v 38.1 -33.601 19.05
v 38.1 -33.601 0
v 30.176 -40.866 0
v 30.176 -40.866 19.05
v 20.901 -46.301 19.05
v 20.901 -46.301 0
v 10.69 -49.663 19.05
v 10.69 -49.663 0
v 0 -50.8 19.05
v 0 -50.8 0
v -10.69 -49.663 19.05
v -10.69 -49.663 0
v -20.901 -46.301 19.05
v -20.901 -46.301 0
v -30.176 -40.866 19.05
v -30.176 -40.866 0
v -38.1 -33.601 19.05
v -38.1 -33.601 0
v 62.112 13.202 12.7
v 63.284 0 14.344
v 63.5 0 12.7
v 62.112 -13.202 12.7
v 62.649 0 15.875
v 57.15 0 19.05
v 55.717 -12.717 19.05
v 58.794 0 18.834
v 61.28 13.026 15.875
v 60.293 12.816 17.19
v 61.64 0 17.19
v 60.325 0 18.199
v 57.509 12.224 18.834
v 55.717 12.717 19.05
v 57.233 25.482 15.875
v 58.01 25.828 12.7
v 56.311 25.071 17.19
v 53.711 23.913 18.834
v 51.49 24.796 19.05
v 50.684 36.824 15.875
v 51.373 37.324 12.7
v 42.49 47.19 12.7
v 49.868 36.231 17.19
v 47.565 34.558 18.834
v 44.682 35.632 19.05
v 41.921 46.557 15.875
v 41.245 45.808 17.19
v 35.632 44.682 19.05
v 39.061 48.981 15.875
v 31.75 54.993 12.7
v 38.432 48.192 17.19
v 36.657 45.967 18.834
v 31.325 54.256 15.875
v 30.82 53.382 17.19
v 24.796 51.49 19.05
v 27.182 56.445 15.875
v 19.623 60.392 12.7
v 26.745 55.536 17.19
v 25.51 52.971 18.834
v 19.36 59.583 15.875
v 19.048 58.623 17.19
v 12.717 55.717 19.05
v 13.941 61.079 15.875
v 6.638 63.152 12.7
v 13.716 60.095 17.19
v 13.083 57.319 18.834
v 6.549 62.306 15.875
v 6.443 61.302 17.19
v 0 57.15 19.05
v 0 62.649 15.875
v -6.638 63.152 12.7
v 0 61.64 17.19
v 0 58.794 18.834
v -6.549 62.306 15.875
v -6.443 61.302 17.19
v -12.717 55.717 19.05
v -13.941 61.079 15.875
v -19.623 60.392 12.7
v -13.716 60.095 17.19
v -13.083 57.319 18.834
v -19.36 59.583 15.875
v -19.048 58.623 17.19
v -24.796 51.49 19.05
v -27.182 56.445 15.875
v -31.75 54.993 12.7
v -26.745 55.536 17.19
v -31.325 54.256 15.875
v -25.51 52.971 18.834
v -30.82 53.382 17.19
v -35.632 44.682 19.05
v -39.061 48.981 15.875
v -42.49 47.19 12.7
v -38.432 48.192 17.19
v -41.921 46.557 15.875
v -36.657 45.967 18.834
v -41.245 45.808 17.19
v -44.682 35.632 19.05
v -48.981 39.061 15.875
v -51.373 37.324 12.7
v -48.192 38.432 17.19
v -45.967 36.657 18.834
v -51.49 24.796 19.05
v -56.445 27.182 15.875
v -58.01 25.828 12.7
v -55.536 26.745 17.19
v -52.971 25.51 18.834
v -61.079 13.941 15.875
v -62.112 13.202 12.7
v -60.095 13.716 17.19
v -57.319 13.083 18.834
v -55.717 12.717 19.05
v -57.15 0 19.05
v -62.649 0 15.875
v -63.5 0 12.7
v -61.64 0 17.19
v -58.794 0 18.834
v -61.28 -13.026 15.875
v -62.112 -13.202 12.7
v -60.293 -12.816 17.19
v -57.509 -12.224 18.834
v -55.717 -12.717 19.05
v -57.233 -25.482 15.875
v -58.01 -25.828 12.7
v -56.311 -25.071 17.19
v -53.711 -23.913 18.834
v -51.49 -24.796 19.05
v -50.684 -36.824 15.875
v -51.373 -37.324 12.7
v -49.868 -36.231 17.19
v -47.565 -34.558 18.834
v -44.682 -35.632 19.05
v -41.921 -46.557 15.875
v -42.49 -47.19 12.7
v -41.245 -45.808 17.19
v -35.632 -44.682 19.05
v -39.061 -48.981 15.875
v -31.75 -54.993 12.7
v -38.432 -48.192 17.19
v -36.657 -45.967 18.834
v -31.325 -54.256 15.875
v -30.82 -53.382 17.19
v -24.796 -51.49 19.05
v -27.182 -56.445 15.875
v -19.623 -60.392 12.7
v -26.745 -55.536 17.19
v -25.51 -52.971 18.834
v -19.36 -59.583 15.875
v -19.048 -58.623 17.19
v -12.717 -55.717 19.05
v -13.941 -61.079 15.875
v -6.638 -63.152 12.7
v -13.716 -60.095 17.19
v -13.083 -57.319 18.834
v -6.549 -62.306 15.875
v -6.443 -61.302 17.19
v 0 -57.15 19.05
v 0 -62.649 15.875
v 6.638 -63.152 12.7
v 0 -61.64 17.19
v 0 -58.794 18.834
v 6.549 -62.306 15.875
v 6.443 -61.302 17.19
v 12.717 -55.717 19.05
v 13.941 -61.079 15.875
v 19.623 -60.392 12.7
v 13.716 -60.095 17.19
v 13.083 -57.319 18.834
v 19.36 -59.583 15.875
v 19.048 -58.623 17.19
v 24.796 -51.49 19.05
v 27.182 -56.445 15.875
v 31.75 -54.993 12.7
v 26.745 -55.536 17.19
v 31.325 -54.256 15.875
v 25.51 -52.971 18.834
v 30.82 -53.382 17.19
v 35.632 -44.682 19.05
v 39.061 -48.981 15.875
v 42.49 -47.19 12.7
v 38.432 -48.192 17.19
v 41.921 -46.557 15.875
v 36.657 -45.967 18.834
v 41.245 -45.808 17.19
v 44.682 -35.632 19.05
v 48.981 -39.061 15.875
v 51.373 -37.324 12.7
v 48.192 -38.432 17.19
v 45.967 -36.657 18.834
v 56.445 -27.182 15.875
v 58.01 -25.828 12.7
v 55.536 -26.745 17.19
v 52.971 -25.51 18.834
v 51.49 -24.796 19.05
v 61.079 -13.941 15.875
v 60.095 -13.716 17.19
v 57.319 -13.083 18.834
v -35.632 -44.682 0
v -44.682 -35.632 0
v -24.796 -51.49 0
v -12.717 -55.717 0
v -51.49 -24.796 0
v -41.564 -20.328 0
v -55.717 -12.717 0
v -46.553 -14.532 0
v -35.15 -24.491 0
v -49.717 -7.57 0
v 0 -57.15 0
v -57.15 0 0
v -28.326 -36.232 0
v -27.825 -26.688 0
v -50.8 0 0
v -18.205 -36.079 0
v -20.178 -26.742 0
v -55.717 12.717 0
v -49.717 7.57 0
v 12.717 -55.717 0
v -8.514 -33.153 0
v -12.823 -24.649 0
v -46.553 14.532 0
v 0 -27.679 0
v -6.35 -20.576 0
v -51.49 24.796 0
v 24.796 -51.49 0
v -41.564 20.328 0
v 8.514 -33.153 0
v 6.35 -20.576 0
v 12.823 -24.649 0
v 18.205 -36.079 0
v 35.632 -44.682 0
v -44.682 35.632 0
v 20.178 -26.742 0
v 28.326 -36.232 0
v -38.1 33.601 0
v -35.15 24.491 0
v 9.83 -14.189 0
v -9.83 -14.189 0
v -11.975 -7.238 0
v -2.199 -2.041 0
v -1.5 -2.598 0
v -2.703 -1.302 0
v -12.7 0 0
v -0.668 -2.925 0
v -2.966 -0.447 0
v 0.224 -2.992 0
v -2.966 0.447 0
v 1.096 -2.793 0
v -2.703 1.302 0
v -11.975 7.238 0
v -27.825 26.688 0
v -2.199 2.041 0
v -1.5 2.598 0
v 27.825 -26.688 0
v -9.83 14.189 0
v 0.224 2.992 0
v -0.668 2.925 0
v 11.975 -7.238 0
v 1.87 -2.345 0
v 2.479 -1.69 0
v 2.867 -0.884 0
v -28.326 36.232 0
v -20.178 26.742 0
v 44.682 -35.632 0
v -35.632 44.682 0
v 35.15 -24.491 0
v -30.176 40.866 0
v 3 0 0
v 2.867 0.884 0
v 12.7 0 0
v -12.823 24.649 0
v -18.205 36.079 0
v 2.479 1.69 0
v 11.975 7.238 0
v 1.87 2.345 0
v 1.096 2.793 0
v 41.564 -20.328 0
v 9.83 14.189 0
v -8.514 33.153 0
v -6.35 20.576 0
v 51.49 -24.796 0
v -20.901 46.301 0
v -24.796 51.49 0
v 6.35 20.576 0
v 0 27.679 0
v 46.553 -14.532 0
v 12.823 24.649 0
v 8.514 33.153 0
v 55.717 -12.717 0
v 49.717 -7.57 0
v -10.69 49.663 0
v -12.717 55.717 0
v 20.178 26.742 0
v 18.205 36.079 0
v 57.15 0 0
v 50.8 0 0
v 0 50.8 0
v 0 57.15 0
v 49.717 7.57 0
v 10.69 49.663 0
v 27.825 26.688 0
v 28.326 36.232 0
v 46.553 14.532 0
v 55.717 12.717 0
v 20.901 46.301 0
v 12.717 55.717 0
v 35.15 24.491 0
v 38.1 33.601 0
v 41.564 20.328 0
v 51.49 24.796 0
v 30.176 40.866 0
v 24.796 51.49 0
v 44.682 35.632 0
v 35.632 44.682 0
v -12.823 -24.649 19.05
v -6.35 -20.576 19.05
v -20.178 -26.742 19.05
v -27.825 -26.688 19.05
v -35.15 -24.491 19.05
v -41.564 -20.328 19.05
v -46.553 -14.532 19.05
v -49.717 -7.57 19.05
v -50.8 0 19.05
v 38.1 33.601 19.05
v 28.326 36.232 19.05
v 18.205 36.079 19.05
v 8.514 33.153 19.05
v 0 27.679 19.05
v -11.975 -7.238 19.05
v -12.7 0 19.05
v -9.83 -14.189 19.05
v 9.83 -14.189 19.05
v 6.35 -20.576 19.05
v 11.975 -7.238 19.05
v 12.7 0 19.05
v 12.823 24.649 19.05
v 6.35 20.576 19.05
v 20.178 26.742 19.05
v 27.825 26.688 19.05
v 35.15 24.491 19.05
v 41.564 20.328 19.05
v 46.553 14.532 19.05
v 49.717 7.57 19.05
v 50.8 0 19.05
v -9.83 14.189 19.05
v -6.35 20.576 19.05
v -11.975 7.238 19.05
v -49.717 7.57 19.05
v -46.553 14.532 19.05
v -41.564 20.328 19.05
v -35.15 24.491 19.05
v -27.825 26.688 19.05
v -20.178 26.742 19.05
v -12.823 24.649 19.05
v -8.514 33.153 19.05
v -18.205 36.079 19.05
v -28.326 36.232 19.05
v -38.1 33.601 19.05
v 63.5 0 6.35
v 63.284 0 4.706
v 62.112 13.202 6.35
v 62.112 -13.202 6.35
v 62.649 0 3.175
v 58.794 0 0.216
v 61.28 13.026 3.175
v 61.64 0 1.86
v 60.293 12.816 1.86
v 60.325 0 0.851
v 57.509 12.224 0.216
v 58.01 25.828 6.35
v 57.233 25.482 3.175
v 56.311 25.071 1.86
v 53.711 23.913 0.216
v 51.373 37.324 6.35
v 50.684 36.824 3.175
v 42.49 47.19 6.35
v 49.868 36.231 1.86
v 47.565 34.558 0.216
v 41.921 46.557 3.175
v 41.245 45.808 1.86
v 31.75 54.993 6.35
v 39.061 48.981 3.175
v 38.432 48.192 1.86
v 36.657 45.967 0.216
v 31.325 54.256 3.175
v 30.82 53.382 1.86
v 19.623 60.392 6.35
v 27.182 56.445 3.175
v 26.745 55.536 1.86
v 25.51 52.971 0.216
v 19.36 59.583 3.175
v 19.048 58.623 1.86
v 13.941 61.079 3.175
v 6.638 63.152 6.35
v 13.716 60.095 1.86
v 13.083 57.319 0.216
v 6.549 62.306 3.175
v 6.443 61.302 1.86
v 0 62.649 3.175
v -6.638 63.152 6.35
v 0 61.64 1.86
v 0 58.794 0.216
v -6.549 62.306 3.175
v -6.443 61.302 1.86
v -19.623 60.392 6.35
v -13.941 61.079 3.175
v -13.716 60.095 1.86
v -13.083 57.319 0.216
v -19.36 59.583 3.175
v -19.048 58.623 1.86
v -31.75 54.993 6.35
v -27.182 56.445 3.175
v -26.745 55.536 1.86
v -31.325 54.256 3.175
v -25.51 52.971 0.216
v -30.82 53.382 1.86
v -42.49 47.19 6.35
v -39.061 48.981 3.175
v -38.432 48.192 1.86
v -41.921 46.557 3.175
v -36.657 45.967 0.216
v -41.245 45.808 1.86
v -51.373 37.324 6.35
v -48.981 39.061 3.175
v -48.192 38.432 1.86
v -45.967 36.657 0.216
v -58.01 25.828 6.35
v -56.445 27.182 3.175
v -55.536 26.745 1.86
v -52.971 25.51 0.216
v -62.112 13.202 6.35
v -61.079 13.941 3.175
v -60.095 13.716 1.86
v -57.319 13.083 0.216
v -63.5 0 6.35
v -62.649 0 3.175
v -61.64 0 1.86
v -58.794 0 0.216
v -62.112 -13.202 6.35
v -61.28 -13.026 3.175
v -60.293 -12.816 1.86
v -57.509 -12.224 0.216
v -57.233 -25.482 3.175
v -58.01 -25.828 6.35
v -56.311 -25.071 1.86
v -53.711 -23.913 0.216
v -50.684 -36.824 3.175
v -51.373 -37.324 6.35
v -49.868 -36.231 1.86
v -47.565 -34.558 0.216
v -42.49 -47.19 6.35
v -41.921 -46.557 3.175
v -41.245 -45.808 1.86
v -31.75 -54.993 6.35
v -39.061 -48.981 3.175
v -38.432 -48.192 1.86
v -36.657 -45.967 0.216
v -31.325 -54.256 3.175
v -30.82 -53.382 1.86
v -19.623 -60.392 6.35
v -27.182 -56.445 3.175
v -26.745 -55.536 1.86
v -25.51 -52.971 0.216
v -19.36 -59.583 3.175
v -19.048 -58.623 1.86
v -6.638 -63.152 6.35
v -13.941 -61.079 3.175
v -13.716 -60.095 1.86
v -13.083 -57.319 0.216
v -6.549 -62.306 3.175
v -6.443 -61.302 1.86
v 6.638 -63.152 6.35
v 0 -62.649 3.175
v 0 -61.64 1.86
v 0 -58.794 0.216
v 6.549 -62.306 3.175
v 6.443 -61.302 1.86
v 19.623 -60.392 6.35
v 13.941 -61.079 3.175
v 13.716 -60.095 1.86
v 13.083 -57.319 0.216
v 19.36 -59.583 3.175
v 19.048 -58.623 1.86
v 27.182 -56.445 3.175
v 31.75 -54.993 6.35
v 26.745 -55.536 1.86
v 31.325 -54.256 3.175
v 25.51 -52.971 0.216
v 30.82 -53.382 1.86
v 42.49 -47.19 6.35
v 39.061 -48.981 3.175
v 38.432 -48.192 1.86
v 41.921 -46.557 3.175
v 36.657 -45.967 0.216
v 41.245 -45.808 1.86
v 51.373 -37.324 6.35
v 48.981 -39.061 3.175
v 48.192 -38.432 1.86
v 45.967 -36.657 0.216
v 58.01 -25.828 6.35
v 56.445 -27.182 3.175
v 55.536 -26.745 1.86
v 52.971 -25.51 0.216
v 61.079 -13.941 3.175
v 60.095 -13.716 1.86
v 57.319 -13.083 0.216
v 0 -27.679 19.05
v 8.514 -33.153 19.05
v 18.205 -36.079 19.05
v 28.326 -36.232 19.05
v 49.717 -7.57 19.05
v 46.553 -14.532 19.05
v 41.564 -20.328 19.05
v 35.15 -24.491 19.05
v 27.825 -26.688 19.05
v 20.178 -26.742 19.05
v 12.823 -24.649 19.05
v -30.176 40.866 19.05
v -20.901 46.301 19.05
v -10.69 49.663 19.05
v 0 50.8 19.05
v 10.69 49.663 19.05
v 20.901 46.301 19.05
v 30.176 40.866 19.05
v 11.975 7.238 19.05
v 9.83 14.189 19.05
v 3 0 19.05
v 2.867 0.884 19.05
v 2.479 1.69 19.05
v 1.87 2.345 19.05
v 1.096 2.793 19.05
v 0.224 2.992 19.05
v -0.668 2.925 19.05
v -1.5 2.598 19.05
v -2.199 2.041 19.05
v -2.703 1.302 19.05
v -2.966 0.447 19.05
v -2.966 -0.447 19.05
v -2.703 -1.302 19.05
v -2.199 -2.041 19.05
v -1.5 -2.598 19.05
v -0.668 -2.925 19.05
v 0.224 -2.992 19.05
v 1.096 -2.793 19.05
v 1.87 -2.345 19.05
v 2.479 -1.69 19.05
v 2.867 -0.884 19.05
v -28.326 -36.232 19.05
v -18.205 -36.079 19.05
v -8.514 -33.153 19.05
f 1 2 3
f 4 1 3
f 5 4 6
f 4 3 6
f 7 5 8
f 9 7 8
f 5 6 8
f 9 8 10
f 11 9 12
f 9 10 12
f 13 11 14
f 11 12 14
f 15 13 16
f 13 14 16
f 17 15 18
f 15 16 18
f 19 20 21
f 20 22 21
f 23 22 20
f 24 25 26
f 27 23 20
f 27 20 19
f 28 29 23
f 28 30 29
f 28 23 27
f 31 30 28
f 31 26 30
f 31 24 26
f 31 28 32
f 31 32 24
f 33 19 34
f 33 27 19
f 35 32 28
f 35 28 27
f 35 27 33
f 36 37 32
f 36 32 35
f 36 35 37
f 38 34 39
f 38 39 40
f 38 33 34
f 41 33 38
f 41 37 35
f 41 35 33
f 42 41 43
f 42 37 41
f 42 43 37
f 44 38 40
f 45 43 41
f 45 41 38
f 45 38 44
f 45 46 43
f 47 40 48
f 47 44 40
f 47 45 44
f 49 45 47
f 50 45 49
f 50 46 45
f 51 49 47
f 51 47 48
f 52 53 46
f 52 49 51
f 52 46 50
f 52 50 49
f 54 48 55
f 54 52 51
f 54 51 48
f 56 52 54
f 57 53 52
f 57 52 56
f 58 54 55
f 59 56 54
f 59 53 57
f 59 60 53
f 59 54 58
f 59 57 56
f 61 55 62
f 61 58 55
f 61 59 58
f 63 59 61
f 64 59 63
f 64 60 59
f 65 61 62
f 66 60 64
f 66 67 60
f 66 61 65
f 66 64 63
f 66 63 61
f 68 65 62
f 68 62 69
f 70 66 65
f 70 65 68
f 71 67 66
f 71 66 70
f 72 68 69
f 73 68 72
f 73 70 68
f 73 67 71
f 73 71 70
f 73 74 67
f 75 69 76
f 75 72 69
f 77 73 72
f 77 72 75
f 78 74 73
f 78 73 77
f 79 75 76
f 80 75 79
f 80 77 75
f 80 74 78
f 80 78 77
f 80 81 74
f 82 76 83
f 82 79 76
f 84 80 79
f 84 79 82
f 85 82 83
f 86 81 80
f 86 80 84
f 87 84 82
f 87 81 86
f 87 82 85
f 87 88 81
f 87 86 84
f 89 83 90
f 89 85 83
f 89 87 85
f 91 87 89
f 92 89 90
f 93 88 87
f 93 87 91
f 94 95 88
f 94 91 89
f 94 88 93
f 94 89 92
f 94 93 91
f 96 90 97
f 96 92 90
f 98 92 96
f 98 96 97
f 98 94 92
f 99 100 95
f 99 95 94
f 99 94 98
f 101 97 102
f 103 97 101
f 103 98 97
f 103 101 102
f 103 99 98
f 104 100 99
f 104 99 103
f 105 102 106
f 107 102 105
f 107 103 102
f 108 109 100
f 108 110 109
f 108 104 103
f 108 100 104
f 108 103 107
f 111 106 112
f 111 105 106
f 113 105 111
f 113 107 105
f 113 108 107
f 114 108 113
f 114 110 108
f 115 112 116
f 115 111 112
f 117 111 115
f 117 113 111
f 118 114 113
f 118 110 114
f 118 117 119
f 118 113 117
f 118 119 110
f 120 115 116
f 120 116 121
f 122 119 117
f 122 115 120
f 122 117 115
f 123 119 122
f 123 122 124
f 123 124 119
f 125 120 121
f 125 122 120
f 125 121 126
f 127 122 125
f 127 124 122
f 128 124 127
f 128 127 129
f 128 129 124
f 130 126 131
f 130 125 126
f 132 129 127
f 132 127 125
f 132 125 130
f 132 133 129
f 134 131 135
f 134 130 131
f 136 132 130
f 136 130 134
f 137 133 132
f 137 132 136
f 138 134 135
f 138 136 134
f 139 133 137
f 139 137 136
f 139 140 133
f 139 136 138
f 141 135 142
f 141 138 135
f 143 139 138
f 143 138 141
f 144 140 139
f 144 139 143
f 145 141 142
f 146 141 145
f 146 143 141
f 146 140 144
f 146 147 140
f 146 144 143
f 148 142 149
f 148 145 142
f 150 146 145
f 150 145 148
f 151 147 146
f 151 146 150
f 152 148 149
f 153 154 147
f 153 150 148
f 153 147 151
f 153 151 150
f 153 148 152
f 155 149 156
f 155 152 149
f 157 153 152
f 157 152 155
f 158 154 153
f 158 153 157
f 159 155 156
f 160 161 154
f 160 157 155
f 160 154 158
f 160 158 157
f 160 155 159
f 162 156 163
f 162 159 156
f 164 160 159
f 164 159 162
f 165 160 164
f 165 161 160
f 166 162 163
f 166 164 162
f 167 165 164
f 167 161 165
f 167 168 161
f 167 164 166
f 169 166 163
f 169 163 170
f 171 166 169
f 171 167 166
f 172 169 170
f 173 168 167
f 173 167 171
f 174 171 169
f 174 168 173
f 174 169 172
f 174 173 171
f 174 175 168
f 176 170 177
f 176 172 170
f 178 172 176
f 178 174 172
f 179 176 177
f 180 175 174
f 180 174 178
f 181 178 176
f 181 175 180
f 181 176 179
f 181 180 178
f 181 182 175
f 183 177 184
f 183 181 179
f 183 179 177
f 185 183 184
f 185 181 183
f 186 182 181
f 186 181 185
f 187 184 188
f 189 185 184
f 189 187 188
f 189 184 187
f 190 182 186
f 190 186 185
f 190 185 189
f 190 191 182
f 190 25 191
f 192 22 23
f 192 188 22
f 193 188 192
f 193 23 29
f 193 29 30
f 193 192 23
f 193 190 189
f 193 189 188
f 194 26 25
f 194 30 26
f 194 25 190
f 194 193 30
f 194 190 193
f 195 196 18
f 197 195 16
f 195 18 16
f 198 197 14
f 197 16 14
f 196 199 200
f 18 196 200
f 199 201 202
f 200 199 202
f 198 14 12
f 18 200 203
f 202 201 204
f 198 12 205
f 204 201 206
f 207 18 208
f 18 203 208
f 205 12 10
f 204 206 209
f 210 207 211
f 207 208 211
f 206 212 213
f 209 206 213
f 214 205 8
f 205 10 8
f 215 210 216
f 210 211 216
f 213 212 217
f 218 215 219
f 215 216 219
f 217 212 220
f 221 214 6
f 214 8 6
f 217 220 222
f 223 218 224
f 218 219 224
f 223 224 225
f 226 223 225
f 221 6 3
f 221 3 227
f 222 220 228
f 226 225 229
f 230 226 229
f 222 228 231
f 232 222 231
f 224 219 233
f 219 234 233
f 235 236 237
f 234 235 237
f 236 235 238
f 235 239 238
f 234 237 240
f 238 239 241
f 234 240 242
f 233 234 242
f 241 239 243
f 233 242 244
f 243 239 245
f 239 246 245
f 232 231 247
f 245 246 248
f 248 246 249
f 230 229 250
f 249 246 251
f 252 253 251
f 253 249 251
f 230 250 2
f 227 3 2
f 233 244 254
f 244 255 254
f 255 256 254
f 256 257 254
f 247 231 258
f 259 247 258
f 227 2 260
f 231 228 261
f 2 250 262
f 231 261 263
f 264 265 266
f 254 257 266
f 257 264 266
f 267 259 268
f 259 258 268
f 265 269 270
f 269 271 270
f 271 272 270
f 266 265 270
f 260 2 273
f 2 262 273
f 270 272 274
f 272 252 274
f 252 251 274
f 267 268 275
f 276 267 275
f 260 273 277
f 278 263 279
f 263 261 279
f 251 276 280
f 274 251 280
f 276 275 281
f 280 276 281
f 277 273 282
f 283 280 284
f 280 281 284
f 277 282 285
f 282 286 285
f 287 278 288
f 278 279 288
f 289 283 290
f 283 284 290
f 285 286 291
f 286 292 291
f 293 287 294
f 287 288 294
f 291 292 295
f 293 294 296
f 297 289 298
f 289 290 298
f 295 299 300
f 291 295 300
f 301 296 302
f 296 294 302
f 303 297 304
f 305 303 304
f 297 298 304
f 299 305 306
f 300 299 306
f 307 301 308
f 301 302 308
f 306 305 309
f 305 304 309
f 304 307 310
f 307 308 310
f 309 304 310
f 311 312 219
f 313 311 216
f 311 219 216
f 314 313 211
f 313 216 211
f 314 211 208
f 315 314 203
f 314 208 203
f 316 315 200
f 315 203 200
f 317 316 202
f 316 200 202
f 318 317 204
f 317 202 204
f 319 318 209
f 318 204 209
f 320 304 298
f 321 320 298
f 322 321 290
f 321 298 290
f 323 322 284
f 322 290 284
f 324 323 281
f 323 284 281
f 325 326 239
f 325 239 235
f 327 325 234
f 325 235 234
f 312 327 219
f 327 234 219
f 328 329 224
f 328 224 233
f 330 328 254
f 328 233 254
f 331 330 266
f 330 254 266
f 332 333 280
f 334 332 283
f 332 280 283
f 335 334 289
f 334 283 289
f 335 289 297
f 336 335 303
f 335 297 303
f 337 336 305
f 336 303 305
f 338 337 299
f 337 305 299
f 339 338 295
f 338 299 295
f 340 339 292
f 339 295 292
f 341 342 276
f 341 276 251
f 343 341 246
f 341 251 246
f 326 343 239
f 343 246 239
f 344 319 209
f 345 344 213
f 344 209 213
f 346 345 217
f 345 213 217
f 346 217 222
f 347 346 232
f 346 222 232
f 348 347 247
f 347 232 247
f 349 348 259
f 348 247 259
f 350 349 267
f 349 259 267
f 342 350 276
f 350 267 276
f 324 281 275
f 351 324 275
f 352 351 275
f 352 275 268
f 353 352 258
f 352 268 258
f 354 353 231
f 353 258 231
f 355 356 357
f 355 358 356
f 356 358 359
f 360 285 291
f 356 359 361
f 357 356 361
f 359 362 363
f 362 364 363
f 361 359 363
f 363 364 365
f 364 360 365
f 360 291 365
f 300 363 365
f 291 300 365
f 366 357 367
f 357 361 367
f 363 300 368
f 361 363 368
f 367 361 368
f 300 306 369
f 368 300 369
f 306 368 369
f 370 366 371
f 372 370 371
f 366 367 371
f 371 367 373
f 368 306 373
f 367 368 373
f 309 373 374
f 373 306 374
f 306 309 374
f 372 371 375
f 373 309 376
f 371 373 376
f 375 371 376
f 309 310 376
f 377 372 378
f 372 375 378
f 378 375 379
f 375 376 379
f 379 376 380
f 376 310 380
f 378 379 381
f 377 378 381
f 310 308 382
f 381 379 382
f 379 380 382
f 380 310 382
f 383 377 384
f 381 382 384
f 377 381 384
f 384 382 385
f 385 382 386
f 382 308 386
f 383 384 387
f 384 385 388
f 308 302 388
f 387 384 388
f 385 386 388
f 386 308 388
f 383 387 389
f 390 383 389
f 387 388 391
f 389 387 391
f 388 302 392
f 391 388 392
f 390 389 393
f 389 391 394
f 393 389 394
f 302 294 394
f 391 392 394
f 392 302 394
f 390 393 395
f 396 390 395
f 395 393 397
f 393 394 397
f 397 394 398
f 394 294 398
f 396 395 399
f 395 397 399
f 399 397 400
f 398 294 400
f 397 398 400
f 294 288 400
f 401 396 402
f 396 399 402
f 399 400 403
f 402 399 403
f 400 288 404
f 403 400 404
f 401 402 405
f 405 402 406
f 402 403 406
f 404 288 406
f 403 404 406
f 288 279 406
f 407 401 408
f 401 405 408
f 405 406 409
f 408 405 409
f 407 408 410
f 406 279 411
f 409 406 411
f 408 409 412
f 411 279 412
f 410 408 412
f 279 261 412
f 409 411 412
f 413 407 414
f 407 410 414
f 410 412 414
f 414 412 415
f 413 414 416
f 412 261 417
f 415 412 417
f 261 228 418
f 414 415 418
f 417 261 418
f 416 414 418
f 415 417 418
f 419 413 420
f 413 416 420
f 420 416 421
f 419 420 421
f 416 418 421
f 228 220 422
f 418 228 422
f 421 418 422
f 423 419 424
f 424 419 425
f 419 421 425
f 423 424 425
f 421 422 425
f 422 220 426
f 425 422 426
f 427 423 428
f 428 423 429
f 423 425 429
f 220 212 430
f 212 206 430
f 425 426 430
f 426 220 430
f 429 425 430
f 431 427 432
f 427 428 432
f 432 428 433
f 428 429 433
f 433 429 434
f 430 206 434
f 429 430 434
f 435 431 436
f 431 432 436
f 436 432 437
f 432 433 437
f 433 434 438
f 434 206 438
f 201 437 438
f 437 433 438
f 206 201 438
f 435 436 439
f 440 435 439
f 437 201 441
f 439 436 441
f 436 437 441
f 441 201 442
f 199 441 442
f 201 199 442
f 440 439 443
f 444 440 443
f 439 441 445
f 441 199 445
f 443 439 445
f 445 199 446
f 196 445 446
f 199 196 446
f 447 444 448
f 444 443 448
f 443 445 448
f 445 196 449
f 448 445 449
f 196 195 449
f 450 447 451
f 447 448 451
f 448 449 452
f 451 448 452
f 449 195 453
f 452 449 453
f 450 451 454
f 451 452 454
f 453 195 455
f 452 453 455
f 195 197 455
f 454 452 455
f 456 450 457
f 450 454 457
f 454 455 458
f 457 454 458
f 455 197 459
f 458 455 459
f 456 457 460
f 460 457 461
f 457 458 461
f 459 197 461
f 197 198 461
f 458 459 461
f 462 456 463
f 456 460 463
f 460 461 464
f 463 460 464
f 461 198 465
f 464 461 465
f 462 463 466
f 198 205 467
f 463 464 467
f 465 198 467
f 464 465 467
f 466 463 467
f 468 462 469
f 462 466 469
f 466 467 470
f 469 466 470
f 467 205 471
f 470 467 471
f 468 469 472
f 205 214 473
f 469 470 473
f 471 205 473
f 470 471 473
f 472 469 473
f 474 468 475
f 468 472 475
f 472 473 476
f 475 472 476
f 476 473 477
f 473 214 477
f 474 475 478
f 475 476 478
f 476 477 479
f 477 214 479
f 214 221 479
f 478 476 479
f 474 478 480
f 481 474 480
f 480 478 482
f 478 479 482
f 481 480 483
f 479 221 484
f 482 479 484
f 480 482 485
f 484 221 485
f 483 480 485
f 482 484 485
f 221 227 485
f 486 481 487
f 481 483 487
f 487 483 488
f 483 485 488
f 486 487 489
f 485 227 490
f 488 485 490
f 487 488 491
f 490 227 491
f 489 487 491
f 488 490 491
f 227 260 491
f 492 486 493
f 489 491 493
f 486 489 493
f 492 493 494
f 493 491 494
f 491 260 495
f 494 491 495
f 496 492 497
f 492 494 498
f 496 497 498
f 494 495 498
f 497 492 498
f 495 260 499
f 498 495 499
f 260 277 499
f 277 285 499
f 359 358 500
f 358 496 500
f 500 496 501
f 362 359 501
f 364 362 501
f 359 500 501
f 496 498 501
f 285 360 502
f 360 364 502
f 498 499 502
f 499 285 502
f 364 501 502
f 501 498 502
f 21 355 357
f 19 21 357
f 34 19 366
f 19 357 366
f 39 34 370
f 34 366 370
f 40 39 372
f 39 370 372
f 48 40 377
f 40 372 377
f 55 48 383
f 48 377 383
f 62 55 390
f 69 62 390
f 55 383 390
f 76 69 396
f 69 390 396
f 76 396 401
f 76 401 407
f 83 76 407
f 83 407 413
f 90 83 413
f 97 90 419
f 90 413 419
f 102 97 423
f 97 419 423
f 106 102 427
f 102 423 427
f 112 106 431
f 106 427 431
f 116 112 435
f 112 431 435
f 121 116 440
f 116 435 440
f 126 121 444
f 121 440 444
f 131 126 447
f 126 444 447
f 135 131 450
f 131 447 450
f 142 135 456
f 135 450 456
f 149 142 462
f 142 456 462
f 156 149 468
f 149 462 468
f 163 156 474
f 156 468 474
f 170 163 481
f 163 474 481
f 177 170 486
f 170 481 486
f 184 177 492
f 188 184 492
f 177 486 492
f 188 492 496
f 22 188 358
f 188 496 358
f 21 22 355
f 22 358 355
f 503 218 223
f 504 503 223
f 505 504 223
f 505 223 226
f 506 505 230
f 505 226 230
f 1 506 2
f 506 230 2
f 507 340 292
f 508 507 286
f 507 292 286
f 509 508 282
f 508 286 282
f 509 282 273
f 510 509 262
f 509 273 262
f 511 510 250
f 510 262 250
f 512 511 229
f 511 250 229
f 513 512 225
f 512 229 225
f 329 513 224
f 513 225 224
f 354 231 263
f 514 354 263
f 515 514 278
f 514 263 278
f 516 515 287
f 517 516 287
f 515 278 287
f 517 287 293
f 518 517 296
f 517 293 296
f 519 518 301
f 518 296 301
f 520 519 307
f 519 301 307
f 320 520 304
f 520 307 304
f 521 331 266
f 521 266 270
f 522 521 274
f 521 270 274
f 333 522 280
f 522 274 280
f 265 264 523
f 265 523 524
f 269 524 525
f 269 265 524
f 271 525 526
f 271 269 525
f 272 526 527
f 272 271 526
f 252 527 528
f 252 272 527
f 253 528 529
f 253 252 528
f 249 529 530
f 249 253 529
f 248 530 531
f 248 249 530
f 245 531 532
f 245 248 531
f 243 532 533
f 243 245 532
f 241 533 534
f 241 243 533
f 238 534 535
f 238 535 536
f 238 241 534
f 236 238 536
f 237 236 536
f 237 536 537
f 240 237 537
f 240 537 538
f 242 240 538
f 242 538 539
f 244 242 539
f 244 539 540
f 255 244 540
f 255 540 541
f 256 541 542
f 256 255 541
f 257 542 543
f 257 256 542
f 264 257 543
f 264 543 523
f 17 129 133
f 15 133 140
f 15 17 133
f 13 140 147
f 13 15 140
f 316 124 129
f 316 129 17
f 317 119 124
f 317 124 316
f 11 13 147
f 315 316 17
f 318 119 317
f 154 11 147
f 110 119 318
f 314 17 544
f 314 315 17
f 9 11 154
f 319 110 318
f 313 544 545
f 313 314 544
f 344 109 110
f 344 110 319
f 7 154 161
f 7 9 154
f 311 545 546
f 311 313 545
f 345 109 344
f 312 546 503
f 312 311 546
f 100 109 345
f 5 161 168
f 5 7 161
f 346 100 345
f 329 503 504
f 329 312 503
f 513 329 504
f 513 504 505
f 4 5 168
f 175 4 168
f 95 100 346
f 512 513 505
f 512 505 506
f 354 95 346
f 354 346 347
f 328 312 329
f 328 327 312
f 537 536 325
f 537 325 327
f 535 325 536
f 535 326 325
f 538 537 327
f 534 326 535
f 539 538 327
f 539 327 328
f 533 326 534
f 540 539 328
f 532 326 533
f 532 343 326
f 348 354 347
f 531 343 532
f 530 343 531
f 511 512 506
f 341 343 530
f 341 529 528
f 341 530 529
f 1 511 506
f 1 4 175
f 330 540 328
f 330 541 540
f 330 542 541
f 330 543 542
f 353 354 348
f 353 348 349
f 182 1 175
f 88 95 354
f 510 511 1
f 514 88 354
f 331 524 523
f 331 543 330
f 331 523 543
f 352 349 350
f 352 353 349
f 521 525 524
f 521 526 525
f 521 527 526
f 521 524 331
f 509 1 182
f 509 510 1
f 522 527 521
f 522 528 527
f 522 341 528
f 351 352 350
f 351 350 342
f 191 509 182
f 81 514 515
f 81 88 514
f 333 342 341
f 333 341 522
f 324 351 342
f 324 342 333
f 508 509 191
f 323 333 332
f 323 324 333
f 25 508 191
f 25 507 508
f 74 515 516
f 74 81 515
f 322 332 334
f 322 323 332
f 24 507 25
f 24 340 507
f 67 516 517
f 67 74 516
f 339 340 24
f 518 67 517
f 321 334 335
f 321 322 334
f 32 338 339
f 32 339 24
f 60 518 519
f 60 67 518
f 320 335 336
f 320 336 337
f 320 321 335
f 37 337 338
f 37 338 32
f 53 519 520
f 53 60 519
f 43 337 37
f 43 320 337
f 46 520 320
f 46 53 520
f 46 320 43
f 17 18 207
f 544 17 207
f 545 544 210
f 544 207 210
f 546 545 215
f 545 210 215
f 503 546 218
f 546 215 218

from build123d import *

# Parameters (mm, degrees)
F0_R     = 63.5
F0_R_2   = 3
F1_DEPTH = 19.05
F2_R     = 6.35


with BuildPart() as f1:
    # F0 (on Top) → F1 (new body)
    with BuildSketch(Plane.XY):
        Circle(F0_R)
        with BuildLine():
            ThreePointArc((38.1, -33.601042), (0, -50.8), (-38.1, -33.601042))
            ThreePointArc((-38.1, -33.601042), (-18.204557, -36.079269), (0, -27.679008))
            ThreePointArc((0, -27.679008), (18.204557, -36.079269), (38.1, -33.601042))
        make_face(mode=Mode.SUBTRACT)
        with BuildLine():
            ThreePointArc((-50.8, 0), (-35.149518, 24.490757), (-6.35, 20.576352))
            ThreePointArc((-6.35, 20.576352), (-11.076402, 10.766949), (-12.7, 0))
            ThreePointArc((-12.7, 0), (-11.076402, -10.766949), (-6.35, -20.576352))
            ThreePointArc((-6.35, -20.576352), (-35.149518, -24.490757), (-50.8, 0))
        make_face(mode=Mode.SUBTRACT)
        Circle(F0_R_2, mode=Mode.SUBTRACT)
        with BuildLine():
            ThreePointArc((6.35, -20.576352), (11.076402, -10.766949), (12.7, 0))
            ThreePointArc((12.7, 0), (11.076402, 10.766949), (6.35, 20.576352))
            ThreePointArc((6.35, 20.576352), (35.149518, 24.490757), (50.8, 0))
            ThreePointArc((50.8, 0), (35.149518, -24.490757), (6.35, -20.576352))
        make_face(mode=Mode.SUBTRACT)
        with BuildLine():
            ThreePointArc((38.1, 33.601042), (18.204557, 36.079269), (0, 27.679008))
            ThreePointArc((0, 27.679008), (-18.204557, 36.079269), (-38.1, 33.601042))
            ThreePointArc((-38.1, 33.601042), (0, 50.8), (38.1, 33.601042))
        make_face(mode=Mode.SUBTRACT)
    extrude(amount=F1_DEPTH)

    # F2
    f2_edges = [f1.edges().sort_by_distance(p)[0] for p in [
        (63.5, 0, 9.525),
        (-63.5, 0, 0),
        (-63.5, 0, 19.05),
    ]]
    fillet(f2_edges, radius=F2_R)


solid = f1.part
